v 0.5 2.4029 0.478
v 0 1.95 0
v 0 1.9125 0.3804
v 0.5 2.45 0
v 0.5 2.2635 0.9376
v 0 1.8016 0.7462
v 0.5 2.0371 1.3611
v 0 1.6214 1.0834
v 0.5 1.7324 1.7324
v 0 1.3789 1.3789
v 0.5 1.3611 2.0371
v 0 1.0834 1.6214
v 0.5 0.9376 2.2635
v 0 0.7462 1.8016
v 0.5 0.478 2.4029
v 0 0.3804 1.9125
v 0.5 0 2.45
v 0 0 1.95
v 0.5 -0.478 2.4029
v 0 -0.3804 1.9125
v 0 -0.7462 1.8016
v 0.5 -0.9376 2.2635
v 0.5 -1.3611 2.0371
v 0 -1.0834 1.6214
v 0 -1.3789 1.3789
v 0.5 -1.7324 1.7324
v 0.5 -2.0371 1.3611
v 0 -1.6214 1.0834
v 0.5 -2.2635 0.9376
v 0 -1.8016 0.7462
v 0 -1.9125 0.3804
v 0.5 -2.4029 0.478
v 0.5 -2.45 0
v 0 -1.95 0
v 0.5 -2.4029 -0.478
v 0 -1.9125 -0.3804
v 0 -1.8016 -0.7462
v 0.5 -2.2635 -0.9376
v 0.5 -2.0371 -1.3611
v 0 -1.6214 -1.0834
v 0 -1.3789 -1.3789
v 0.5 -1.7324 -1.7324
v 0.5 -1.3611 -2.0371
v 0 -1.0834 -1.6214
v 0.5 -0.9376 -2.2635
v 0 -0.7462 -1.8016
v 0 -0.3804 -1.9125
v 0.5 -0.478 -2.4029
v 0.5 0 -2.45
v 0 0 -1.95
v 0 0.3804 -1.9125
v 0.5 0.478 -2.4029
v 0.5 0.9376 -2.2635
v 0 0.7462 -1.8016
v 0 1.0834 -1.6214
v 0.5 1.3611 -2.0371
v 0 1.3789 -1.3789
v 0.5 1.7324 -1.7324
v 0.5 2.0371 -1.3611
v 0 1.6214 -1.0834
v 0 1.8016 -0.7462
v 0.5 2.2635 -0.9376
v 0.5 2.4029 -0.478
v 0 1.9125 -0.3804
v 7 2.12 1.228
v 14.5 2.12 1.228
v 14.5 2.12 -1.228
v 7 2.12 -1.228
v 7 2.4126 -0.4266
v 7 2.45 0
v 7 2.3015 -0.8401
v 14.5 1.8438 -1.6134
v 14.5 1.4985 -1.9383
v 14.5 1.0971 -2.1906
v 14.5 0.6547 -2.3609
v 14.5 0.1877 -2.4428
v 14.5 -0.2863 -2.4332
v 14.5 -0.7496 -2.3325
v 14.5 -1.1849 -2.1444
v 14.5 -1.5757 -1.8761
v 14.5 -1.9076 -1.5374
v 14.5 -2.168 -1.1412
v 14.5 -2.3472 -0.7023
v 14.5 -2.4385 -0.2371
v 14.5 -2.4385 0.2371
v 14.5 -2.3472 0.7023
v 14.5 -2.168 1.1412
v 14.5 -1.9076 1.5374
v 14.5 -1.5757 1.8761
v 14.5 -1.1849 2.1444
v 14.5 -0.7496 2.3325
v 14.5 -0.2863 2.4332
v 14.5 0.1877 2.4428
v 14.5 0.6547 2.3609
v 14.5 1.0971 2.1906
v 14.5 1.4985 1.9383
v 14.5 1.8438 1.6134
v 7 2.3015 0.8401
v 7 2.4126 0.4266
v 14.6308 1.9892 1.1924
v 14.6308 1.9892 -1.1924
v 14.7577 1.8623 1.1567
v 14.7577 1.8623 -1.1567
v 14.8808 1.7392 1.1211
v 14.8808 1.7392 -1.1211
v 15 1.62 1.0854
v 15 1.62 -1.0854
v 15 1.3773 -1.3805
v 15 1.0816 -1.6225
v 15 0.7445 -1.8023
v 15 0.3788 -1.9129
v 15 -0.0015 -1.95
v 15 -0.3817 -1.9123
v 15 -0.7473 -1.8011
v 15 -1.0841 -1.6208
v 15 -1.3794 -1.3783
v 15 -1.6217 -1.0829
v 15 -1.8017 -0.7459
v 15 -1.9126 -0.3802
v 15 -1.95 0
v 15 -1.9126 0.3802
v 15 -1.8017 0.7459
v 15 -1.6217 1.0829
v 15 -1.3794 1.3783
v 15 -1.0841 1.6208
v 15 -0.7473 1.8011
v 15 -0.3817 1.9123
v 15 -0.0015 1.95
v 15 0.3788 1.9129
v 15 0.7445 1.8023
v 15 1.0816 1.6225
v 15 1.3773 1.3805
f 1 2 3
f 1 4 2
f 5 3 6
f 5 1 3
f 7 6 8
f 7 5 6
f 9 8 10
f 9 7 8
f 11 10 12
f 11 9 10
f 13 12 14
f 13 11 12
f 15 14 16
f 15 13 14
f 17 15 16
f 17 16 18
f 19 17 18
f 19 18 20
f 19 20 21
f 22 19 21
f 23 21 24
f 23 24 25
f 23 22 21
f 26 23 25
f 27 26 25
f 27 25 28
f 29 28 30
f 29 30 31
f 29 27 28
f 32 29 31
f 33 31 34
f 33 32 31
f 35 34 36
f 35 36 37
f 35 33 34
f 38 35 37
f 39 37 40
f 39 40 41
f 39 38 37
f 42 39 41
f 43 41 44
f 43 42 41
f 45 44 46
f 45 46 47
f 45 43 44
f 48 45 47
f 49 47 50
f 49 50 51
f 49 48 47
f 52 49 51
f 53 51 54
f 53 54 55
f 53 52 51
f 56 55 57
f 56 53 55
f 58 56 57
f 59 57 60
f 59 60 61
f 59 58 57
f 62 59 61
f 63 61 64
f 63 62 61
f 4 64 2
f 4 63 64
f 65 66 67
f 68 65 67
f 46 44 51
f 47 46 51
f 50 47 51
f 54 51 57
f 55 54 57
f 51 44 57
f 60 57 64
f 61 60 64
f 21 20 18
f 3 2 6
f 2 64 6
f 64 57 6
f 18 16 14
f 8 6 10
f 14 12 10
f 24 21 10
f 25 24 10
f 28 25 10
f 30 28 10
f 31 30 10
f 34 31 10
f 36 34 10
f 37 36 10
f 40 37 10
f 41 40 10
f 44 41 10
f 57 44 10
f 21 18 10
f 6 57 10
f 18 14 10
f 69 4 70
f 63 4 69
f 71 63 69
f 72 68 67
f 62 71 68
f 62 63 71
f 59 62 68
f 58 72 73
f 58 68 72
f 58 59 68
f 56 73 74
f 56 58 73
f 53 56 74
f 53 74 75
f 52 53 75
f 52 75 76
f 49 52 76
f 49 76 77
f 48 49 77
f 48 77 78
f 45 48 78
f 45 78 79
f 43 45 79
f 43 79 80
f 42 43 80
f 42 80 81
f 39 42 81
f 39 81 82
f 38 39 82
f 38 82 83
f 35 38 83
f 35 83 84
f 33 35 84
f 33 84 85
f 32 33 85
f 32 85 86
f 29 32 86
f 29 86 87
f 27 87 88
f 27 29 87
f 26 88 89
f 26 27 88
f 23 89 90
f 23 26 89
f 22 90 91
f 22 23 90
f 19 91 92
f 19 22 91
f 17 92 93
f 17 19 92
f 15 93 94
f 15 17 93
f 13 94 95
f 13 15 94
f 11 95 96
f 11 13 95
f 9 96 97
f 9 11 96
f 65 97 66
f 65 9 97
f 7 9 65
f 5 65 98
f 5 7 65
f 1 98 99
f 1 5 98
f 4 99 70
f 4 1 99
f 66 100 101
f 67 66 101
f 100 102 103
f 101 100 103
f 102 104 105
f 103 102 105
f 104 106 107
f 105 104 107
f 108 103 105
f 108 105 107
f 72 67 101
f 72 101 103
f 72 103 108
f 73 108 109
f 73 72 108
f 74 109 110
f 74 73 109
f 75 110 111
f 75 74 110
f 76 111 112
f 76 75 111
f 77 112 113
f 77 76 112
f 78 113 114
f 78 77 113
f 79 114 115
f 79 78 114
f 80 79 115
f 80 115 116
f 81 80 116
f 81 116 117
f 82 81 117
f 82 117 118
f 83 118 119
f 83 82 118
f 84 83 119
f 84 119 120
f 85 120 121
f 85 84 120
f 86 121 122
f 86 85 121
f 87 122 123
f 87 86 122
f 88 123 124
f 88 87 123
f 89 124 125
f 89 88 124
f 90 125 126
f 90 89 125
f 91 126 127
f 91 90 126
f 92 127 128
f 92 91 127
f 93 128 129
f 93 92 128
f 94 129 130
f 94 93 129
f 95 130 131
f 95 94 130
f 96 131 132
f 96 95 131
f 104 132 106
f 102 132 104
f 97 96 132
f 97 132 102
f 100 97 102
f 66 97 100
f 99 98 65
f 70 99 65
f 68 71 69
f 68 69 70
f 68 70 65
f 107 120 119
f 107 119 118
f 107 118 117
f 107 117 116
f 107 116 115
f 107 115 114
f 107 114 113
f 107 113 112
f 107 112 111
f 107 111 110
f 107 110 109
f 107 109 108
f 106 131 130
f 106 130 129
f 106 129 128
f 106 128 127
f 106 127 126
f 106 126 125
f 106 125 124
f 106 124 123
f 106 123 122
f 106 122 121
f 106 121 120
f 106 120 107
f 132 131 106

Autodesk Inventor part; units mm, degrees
ref_plane "YZ Plane" through (0, 0, 0) normal (1, 0, 0) x (0, 1, 0)
ref_plane "XZ Plane" through (0, 0, 0) normal (0, 1, 0) x (-1, 0, 0)
ref_plane "XY Plane" through (0, 0, 0) normal (0, 0, 1) x (1, 0, 0)
sketch "Sketch1" plane through (0, 0, 0) normal (1, 0, 0) x (0, 1, 0)
  circle A0 centre (0, 0) radius 2.45
  dimension "d0" = 4.9
extrude "Extrusion1" add sketch "Sketch1" along normal blind 15
sketch "Sketch2" plane through (15, 0, 0) normal (1, 0, 0) x (0, 0, -1)
  circle A0 centre (0, 0) radius 2.45 projected
  line L0 (-1.228, 2.12) -> (1.228, 2.12)
  dimension "d6" = 0.33
extrude "Extrusion2" cut sketch "Sketch2" against normal blind 8 contours L0 A0 picked at (-0.0856, 2.2255)
chamfer "Chamfer1" distance 0.5 angle 45 3 edges at (15, -2.45, 0) (0, -2.45, 0) (15, 2.12, 0)
properties part number "parrallelShaftPin"
